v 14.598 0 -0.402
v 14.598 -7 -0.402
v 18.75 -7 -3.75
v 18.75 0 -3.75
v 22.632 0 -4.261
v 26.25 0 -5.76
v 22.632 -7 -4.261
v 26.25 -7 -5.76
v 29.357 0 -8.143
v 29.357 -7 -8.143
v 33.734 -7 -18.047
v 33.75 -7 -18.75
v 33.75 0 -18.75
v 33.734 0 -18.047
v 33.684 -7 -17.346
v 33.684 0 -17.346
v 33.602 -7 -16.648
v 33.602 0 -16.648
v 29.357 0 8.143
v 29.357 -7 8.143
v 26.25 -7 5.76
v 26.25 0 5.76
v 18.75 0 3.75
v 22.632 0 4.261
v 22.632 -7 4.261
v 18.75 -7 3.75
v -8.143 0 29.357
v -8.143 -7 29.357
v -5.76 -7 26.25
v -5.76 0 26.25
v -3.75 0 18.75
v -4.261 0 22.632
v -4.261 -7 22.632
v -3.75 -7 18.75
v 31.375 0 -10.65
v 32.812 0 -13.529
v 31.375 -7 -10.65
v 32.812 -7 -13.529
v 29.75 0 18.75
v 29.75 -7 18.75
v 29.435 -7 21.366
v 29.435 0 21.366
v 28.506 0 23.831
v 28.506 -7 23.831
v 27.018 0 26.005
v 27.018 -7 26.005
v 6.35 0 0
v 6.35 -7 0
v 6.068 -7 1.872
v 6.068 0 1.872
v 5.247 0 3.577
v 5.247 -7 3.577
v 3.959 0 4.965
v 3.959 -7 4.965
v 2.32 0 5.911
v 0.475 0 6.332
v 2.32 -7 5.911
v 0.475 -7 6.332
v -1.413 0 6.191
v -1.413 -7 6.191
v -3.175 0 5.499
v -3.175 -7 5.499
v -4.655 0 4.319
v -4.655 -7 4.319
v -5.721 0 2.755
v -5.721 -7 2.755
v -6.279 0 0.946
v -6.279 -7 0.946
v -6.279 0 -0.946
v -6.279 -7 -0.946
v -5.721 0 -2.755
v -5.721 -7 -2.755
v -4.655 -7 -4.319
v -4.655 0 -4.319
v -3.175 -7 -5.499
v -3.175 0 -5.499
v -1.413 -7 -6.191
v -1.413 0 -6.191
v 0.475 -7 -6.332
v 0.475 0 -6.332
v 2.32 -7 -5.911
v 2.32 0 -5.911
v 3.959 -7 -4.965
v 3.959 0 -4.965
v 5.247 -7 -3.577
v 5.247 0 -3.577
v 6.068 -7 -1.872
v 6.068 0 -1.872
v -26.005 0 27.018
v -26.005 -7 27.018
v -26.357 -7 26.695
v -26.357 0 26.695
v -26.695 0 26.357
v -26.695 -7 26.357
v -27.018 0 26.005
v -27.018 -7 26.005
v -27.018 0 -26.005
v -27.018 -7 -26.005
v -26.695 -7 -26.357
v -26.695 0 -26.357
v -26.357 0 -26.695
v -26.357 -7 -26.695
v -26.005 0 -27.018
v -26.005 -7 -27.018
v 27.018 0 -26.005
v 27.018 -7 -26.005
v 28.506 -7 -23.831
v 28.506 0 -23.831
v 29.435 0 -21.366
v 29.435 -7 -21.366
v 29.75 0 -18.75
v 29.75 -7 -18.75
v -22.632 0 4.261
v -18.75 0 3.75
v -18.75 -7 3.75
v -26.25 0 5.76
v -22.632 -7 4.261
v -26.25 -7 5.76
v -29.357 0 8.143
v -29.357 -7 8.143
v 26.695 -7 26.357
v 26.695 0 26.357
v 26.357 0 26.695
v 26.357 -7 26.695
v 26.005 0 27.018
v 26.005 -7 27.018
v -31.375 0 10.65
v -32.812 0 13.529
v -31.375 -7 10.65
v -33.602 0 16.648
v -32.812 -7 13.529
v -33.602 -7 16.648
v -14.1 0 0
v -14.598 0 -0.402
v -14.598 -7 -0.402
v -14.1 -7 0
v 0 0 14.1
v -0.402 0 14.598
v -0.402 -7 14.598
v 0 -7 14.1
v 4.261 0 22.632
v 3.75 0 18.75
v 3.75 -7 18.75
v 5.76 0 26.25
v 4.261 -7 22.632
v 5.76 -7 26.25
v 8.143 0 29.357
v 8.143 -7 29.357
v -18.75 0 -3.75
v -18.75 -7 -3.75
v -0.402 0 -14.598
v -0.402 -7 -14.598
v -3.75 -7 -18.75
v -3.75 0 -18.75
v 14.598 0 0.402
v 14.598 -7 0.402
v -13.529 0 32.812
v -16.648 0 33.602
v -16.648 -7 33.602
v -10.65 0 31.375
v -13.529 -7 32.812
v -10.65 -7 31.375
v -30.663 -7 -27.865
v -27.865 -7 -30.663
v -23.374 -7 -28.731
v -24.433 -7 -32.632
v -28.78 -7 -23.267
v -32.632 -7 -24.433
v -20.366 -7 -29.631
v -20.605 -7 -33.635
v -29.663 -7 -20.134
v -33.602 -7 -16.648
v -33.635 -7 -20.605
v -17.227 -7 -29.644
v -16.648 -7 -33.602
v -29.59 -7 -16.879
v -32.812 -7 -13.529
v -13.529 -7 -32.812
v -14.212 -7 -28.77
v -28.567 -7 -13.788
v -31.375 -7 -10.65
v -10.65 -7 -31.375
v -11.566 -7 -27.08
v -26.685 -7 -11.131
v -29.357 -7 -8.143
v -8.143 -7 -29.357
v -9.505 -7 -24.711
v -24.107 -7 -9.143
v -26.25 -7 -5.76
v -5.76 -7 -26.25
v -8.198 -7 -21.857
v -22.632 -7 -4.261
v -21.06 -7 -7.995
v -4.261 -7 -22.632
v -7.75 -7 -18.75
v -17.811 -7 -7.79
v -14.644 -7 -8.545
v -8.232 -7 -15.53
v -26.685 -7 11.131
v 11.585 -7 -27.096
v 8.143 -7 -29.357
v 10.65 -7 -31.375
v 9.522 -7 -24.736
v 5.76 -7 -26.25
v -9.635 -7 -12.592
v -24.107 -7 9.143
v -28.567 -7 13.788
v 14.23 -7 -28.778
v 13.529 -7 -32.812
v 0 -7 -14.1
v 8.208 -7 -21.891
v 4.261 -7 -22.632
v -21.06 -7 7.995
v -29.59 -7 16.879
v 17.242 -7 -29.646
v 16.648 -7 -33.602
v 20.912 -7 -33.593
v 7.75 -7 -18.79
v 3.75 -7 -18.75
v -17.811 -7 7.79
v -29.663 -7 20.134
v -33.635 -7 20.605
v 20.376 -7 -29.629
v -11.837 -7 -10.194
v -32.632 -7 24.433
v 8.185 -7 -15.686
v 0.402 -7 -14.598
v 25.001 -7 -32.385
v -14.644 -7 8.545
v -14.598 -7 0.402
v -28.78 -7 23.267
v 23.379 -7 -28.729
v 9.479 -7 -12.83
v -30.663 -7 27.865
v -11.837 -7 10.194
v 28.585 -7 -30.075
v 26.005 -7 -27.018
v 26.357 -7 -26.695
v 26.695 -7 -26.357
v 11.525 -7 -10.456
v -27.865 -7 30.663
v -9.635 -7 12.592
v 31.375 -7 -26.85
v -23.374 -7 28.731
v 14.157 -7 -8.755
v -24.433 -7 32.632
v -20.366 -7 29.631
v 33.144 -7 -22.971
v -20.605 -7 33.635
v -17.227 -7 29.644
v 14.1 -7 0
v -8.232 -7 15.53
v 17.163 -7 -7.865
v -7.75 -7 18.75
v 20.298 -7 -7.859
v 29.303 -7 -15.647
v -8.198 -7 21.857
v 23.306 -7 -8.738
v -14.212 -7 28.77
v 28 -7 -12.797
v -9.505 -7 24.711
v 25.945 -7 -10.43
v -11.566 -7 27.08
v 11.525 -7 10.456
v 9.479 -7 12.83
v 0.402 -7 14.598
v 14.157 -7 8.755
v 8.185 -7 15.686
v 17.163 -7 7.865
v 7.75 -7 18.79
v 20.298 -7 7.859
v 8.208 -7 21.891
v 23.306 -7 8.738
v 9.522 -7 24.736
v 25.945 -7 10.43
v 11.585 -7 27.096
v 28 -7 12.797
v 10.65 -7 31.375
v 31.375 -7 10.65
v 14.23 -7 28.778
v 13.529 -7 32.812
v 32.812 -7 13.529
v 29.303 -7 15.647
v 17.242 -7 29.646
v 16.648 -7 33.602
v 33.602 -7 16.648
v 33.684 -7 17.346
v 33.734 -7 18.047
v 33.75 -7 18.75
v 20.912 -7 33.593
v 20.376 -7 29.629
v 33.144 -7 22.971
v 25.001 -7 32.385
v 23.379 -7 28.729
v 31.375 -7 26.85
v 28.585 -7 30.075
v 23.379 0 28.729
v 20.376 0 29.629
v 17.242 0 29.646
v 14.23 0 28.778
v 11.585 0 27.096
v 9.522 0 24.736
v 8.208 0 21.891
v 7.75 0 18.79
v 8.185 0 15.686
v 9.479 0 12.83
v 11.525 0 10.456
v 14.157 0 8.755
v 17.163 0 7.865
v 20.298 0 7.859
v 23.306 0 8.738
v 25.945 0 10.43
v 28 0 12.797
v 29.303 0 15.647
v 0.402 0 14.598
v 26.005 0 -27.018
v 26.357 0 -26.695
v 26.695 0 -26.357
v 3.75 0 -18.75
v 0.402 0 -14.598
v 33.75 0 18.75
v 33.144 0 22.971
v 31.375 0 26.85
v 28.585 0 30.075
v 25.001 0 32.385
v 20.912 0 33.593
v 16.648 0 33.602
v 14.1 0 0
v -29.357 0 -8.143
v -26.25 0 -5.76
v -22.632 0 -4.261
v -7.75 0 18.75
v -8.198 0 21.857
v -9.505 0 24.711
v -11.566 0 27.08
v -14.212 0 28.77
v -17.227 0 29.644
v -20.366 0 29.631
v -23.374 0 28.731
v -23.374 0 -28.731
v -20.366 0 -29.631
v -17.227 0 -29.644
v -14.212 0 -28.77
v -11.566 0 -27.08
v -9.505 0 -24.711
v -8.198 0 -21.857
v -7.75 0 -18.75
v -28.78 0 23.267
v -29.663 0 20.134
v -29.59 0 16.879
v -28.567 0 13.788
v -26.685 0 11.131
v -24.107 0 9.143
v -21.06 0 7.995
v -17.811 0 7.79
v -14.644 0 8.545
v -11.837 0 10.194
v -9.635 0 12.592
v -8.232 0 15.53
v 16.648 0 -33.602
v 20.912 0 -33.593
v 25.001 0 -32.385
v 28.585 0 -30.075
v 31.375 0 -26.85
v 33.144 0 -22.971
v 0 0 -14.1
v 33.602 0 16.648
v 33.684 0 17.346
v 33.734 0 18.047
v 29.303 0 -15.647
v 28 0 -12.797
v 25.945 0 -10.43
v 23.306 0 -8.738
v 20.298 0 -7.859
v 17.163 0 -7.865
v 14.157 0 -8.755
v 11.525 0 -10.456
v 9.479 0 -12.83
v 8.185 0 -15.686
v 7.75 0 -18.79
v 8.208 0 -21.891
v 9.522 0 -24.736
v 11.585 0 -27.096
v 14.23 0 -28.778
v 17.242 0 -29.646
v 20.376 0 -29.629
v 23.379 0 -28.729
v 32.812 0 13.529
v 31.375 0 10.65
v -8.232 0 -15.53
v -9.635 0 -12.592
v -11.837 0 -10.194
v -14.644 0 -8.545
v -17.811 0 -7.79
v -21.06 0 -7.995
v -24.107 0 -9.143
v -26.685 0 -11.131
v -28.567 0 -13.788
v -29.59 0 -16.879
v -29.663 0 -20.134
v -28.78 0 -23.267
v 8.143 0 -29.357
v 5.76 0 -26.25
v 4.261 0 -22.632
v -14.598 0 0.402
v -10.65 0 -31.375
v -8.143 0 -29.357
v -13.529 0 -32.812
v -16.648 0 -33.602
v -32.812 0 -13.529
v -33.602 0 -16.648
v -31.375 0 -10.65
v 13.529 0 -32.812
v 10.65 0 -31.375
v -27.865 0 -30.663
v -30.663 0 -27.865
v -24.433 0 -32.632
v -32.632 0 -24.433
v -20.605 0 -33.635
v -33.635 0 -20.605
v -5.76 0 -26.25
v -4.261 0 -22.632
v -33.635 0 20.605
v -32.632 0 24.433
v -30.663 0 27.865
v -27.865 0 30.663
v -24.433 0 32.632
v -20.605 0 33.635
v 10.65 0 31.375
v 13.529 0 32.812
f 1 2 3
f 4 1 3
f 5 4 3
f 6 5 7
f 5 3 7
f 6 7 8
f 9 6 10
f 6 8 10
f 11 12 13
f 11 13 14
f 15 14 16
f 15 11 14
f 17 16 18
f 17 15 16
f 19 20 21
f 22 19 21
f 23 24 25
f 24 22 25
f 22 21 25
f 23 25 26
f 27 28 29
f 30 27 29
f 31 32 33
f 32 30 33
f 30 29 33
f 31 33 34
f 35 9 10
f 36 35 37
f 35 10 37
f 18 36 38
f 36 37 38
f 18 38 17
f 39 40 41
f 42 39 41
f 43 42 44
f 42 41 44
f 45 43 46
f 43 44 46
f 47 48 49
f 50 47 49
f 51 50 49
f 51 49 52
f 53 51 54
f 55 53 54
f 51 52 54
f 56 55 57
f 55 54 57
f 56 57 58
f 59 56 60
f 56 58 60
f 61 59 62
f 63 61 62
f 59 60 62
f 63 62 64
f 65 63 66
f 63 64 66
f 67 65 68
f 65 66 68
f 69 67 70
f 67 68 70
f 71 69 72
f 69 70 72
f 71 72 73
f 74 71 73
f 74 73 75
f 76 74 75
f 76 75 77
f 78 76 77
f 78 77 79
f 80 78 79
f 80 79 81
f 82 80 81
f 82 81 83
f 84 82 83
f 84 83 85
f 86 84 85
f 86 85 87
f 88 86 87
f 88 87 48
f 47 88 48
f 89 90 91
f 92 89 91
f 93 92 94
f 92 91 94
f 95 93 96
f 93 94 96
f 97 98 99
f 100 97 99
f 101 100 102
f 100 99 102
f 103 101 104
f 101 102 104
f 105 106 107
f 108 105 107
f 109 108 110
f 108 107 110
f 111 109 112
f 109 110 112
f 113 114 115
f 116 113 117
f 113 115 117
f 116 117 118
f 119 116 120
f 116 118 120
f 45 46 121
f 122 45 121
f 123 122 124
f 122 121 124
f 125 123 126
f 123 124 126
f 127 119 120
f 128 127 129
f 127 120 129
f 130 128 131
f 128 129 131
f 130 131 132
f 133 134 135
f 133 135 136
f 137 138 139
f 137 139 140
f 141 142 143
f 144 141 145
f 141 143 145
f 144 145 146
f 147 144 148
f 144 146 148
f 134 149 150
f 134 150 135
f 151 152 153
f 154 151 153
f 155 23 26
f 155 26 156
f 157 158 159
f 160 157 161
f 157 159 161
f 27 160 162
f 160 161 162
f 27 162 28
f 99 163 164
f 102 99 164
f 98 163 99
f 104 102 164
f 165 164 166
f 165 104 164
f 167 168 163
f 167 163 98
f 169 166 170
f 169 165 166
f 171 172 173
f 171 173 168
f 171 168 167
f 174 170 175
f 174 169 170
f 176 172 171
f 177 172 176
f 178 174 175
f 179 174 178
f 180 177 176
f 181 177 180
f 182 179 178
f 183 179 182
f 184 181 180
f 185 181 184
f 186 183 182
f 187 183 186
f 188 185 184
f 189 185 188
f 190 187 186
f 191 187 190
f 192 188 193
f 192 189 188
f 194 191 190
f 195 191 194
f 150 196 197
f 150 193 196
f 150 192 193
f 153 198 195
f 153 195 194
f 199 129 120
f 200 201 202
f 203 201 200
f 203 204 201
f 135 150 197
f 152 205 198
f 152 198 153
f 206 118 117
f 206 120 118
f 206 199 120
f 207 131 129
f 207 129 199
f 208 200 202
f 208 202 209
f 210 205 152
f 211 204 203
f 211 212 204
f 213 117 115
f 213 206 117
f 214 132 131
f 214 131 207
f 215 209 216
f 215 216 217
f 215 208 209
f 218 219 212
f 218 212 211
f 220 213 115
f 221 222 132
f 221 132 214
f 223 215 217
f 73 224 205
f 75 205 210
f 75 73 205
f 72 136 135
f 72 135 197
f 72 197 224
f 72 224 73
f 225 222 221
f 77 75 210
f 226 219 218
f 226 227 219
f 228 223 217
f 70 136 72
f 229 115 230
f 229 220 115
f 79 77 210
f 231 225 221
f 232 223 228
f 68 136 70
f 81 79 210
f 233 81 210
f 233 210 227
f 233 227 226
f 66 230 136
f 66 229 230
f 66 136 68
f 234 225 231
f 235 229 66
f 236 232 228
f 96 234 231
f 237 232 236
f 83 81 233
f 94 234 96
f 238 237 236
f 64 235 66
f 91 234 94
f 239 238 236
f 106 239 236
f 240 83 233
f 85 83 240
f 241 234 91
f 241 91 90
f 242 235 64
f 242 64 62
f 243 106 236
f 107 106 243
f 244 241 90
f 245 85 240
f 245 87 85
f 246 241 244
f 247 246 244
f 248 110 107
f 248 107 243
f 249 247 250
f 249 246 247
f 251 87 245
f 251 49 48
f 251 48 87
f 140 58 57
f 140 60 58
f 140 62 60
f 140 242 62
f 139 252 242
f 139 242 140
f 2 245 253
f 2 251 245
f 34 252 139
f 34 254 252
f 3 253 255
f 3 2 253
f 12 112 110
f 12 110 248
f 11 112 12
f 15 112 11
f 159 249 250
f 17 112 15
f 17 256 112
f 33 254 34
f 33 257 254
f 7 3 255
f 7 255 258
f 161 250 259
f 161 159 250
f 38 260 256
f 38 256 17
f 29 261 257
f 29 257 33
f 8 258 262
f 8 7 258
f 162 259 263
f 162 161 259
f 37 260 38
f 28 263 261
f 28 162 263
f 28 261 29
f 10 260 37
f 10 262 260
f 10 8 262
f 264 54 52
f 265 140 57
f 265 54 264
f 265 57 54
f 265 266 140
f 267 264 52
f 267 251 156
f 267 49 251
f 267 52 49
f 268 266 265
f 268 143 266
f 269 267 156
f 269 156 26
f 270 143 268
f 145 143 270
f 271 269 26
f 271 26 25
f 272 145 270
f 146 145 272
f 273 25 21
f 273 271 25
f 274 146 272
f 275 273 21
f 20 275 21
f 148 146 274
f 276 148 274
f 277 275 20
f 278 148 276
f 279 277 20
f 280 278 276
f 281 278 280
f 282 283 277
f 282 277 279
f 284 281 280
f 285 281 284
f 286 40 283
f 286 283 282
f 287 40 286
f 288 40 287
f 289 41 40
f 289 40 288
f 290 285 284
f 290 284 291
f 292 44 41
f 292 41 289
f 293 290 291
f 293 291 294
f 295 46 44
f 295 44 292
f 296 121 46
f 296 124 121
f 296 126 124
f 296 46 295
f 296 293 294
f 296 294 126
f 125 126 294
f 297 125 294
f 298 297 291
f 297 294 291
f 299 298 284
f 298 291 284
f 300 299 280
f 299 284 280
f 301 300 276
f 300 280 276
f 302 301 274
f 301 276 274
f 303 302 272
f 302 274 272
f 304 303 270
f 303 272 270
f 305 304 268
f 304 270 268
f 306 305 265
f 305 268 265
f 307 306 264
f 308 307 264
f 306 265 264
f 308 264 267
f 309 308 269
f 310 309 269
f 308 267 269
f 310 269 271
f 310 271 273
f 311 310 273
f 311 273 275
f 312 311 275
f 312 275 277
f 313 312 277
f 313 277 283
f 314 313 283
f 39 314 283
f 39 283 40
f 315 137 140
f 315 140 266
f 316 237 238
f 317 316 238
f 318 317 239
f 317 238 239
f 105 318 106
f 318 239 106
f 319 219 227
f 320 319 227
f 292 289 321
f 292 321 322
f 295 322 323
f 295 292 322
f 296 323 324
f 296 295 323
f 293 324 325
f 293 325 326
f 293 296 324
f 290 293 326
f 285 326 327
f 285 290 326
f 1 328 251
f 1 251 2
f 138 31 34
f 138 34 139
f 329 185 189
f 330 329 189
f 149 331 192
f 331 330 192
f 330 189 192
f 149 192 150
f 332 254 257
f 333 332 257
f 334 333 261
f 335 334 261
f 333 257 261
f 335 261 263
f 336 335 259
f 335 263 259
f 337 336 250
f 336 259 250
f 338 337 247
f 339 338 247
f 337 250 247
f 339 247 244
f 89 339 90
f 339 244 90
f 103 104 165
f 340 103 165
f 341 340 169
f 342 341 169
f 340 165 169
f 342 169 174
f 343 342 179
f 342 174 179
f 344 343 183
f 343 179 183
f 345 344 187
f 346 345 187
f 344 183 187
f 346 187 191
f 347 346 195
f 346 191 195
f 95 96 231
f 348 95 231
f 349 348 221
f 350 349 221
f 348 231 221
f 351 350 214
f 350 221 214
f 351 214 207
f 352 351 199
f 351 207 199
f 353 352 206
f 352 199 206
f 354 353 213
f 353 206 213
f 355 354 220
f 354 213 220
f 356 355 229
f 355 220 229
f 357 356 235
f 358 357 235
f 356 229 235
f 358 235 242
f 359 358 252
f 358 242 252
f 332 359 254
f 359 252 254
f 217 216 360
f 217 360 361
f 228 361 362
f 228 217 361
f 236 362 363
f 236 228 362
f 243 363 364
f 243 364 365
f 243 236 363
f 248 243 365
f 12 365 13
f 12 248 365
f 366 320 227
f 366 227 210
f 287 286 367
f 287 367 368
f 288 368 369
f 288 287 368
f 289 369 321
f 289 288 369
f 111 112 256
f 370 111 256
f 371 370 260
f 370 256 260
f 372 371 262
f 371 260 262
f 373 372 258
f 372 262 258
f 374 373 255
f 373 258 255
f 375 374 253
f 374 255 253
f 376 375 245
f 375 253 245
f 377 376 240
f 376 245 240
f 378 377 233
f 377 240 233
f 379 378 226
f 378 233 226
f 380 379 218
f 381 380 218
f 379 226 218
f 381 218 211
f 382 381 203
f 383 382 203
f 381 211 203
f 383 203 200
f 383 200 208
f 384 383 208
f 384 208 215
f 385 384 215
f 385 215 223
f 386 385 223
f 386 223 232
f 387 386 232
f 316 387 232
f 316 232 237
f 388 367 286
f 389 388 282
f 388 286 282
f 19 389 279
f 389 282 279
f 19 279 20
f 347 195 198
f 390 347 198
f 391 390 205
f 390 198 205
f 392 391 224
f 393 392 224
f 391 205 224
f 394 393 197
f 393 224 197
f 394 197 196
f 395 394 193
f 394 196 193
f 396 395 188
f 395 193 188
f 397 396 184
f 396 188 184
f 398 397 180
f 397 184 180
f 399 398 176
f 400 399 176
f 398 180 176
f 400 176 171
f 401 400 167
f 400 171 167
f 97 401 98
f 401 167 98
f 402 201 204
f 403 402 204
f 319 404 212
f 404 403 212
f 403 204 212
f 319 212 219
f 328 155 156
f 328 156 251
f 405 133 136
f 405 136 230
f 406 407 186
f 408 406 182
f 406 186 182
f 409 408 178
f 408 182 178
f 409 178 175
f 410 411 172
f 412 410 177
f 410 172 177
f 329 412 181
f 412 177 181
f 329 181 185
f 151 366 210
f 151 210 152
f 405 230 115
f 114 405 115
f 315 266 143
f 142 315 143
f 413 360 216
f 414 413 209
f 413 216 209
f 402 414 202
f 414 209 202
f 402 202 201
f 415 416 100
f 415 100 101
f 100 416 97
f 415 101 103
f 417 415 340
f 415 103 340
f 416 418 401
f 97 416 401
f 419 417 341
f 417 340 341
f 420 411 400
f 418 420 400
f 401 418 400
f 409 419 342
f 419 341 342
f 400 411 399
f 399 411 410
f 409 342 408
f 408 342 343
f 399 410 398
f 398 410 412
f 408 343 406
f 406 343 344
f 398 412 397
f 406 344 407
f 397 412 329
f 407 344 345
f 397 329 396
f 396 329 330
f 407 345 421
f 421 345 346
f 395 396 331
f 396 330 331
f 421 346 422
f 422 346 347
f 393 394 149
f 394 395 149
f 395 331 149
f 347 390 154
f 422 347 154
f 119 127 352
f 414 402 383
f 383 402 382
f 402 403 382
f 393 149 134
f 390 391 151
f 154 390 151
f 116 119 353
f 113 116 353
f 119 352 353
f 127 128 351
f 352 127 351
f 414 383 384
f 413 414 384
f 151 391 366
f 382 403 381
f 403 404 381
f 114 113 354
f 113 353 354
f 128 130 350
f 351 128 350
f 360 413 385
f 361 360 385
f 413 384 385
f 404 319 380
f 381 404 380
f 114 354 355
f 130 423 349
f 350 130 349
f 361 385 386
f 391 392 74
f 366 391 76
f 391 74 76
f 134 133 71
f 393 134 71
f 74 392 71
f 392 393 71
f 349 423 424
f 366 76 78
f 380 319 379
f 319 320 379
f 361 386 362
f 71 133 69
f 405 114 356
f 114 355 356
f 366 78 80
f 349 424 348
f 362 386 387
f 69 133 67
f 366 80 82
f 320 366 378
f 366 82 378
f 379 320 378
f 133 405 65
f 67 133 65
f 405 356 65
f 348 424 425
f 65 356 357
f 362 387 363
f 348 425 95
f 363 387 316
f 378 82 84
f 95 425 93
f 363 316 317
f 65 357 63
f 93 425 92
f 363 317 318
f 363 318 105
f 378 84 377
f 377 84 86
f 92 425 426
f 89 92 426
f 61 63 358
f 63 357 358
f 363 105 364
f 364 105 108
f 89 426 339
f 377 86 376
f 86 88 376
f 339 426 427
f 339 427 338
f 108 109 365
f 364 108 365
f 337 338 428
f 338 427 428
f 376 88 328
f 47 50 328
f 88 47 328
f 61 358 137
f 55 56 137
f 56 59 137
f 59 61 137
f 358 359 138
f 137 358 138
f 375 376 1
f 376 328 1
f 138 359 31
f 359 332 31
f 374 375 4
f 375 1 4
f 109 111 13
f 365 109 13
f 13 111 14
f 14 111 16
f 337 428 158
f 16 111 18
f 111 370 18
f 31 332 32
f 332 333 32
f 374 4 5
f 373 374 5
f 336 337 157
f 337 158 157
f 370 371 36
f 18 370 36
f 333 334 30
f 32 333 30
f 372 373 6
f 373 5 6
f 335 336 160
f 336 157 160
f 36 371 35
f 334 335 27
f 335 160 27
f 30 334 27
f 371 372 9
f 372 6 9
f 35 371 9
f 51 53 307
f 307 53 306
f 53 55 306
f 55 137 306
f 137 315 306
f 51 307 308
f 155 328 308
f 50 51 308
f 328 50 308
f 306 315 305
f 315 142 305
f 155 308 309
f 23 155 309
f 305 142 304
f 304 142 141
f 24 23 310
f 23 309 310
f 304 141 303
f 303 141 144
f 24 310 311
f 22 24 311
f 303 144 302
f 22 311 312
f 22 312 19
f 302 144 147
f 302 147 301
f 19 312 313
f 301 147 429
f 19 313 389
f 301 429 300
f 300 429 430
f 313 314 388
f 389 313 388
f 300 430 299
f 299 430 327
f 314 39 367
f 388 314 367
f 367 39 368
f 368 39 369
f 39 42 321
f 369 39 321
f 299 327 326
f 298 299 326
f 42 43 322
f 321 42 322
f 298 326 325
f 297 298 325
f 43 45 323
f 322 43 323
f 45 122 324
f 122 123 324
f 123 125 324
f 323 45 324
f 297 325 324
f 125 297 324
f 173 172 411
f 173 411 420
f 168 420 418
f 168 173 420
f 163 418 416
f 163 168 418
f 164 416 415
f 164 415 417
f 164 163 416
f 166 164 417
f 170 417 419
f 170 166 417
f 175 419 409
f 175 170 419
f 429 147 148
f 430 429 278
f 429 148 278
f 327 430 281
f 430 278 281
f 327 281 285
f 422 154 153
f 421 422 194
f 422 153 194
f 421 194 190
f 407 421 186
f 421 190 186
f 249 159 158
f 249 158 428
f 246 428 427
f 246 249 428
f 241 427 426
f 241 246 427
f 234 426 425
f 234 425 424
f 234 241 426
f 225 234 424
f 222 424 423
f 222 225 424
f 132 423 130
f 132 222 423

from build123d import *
from build123d import SkipClean  # not in build123d's __all__

# Parameters (mm, degrees)
F0_R     = 37.5
F1_DEPTH = 7
F2_R     = 6.35
F3_DEPTH = 7.001
F5_DEPTH = 7.001
F7_DEPTH = 7
F9_DEPTH = 7.001


with BuildPart() as f1:
    # F0 (on Front) → F1 (new body)
    with BuildSketch(Plane.XZ):
        Circle(F0_R)
    extrude(amount=F1_DEPTH)

    # F2 (on face) → F3 (cut, through all)
    with BuildSketch(Plane.XZ.offset(7)):
        Circle(F2_R)
    extrude(amount=-F3_DEPTH, mode=Mode.SUBTRACT)

    # F4 (on face) → F5 (cut, through all)
    with BuildSketch(Plane.XZ.offset(7)):
        with BuildLine():
            Line((-8.1433982822, 29.3566017178), (0, 37.5))
            ThreePointArc((0, 37.5), (-8.5491327229, 36.5124955281), (-16.6480090834, 33.6019909166))
            ThreePointArc((-16.6480090834, 33.6019909166), (-12.0505288232, 32.1707706914), (-8.1433982822, 29.3566017178))
        make_face()
        with BuildLine():
            ThreePointArc((16.6480090834, 33.6019909166), (8.5491327229, 36.5124955281), (0, 37.5))
            Line((0, 37.5), (8.1433982822, 29.3566017178))
            ThreePointArc((8.1433982822, 29.3566017178), (12.0505288232, 32.1707706914), (16.6480090834, 33.6019909166))
        make_face()
        with BuildLine():
            Line((0, 18.75), (0, 37.5))
            Line((0, 37.5), (-8.1433982822, 29.3566017178))
            ThreePointArc((-8.1433982822, 29.3566017178), (-4.8918070123, 24.4902514855), (-3.75, 18.75))
            Line((-3.75, 18.75), (0, 18.75))
        make_face()
        with BuildLine():
            Line((8.1433982822, 29.3566017178), (0, 37.5))
            Line((0, 37.5), (0, 18.75))
            Line((0, 18.75), (3.75, 18.75))
            ThreePointArc((3.75, 18.75), (4.8918070123, 24.4902514855), (8.1433982822, 29.3566017178))
        make_face()
        Polygon((0, 15), (0, 18.75), (-3.75, 18.75), align=None)
        Polygon((0, 15), (-3.75, 18.75), (-0.4017027864, 14.5982972136), align=None)
        Polygon((3.75, 18.75), (0, 18.75), (0, 15), align=None)
        Polygon((0.4017027864, 14.5982972136), (3.75, 18.75), (0, 15), align=None)
        with BuildLine():
            Line((-29.3566017178, -8.1433982822), (-37.5, 0))
            ThreePointArc((-37.5, 0), (-36.5124955281, -8.5491327229), (-33.6019909166, -16.6480090834))
            ThreePointArc((-33.6019909166, -16.6480090834), (-32.1707706914, -12.0505288232), (-29.3566017178, -8.1433982822))
        make_face()
        with BuildLine():
            ThreePointArc((-29.3566017178, 8.1433982822), (-32.1707706914, 12.0505288232), (-33.6019909166, 16.6480090834))
            ThreePointArc((-33.6019909166, 16.6480090834), (-36.5124955281, 8.5491327229), (-37.5, 0))
            Line((-37.5, 0), (-29.3566017178, 8.1433982822))
        make_face()
        with BuildLine():
            ThreePointArc((-18.75, 3.75), (-24.4902514855, 4.8918070123), (-29.3566017178, 8.1433982822))
            Line((-29.3566017178, 8.1433982822), (-37.5, 0))
            Line((-37.5, 0), (-18.75, 0))
            Line((-18.75, 0), (-18.75, 3.75))
        make_face()
        with BuildLine():
            Line((-18.75, 0), (-37.5, 0))
            Line((-37.5, 0), (-29.3566017178, -8.1433982822))
            ThreePointArc((-29.3566017178, -8.1433982822), (-24.4902514855, -4.8918070123), (-18.75, -3.75))
            Line((-18.75, -3.75), (-18.75, 0))
        make_face()
        Polygon((0.4017027864, 14.5982972136), (0, 15), (0, 14.1002080444), align=None)
        Polygon((0, 14.1002080444), (0, 15), (-0.4017027864, 14.5982972136), align=None)
        Polygon((-15, 0), (-18.75, 3.75), (-18.75, 0), align=None)
        Polygon((-14.5982972136, 0.4017027864), (-18.75, 3.75), (-15, 0), align=None)
        Polygon((-14.5982972136, 0.4017027864), (-15, 0), (-14.1002080444, 0), align=None)
        Polygon((-14.1002080444, 0), (-15, 0), (-14.5982972136, -0.4017027864), align=None)
        Polygon((-14.5982972136, -0.4017027864), (-15, 0), (-18.75, -3.75), align=None)
        Polygon((-15, 0), (-18.75, 0), (-18.75, -3.75), align=None)
        with BuildLine():
            ThreePointArc((-8.1433982822, -29.3566017178), (-12.0505288232, -32.1707706914), (-16.6480090834, -33.6019909166))
            ThreePointArc((-16.6480090834, -33.6019909166), (-8.5491327229, -36.5124955281), (0, -37.5))
            Line((0, -37.5), (-8.1433982822, -29.3566017178))
        make_face()
        with BuildLine():
            ThreePointArc((0, -37.5), (8.5491327229, -36.5124955281), (16.6480090834, -33.6019909166))
            ThreePointArc((16.6480090834, -33.6019909166), (12.0505288232, -32.1707706914), (8.1433982822, -29.3566017178))
            Line((8.1433982822, -29.3566017178), (0, -37.5))
        make_face()
        with BuildLine():
            Line((0, -37.5), (8.1433982822, -29.3566017178))
            ThreePointArc((8.1433982822, -29.3566017178), (4.8918070123, -24.4902514855), (3.75, -18.75))
            Line((3.75, -18.75), (0, -18.75))
            Line((0, -18.75), (0, -37.5))
        make_face()
        with BuildLine():
            Line((-8.1433982822, -29.3566017178), (0, -37.5))
            Line((0, -37.5), (0, -18.75))
            Line((0, -18.75), (-3.75, -18.75))
            ThreePointArc((-3.75, -18.75), (-4.8918070123, -24.4902514855), (-8.1433982822, -29.3566017178))
        make_face()
        Polygon((-0.4017027864, -14.5982972136), (0, -15), (0, -14.1002080444), align=None)
        Polygon((0, -14.1002080444), (0, -15), (0.4017027864, -14.5982972136), align=None)
        Polygon((0, -15), (3.75, -18.75), (0.4017027864, -14.5982972136), align=None)
        Polygon((-0.4017027864, -14.5982972136), (-3.75, -18.75), (0, -15), align=None)
        Polygon((0, -15), (-3.75, -18.75), (0, -18.75), align=None)
        Polygon((0, -18.75), (3.75, -18.75), (0, -15), align=None)
        with BuildLine():
            ThreePointArc((37.5, 0), (36.5124955281, 8.5491327229), (33.6019909166, 16.6480090834))
            ThreePointArc((33.6019909166, 16.6480090834), (32.1707706914, 12.0505288232), (29.3566017178, 8.1433982822))
            Line((29.3566017178, 8.1433982822), (37.5, 0))
        make_face()
        with BuildLine():
            Line((37.5, 0), (29.3566017178, 8.1433982822))
            ThreePointArc((29.3566017178, 8.1433982822), (24.4902514855, 4.8918070123), (18.75, 3.75))
            Line((18.75, 3.75), (18.75, 0))
            Line((18.75, 0), (37.5, 0))
        make_face()
        with BuildLine():
            ThreePointArc((33.6019909166, -16.6480090834), (36.5124955281, -8.5491327229), (37.5, 0))
            Line((37.5, 0), (29.3566017178, -8.1433982822))
            ThreePointArc((29.3566017178, -8.1433982822), (32.1707706914, -12.0505288232), (33.6019909166, -16.6480090834))
        make_face()
        with BuildLine():
            Line((29.3566017178, -8.1433982822), (37.5, 0))
            Line((37.5, 0), (18.75, 0))
            Line((18.75, 0), (18.75, -3.75))
            ThreePointArc((18.75, -3.75), (24.4902514855, -4.8918070123), (29.3566017178, -8.1433982822))
        make_face()
        Polygon((15, 0), (18.75, 3.75), (14.5982972136, 0.4017027864), align=None)
        Polygon((18.75, 0), (18.75, 3.75), (15, 0), align=None)
        Polygon((18.75, -3.75), (18.75, 0), (15, 0), align=None)
        Polygon((18.75, -3.75), (15, 0), (14.5982972136, -0.4017027864), align=None)
        Polygon((14.5982972136, -0.4017027864), (15, 0), (14.1002080444, 0), align=None)
        Polygon((14.1002080444, 0), (15, 0), (14.5982972136, 0.4017027864), align=None)
    extrude(amount=-F5_DEPTH, mode=Mode.SUBTRACT)

    # F6 (on face) → F7 (join)
    with BuildSketch(Plane.XZ.offset(7)):
        with BuildLine():
            ThreePointArc((-33.6019909166, 16.6480090834), (-26.5165042945, 26.5165042945), (-16.6480090834, 33.6019909166))
            ThreePointArc((-16.6480090834, 33.6019909166), (-29.3566017178, 29.3566017178), (-33.6019909166, 16.6480090834))
        make_face()
        with BuildLine():
            ThreePointArc((-16.6480090834, -33.6019909166), (-26.5165042945, -26.5165042945), (-33.6019909166, -16.6480090834))
            ThreePointArc((-33.6019909166, -16.6480090834), (-29.3566017178, -29.3566017178), (-16.6480090834, -33.6019909166))
        make_face()
        with BuildLine():
            ThreePointArc((33.75, -18.75), (33.7129519773, -17.6964022943), (33.6019909166, -16.6480090834))
            ThreePointArc((33.6019909166, -16.6480090834), (26.5165042945, -26.5165042945), (16.6480090834, -33.6019909166))
            ThreePointArc((16.6480090834, -33.6019909166), (28.5853987273, -30.0754108921), (33.75, -18.75))
        make_face()
        with BuildLine():
            ThreePointArc((33.75, 18.75), (28.5853987273, 30.0754108921), (16.6480090834, 33.6019909166))
            ThreePointArc((16.6480090834, 33.6019909166), (26.5165042945, 26.5165042945), (33.6019909166, 16.6480090834))
            ThreePointArc((33.6019909166, 16.6480090834), (33.7129519773, 17.6964022943), (33.75, 18.75))
        make_face()
    with SkipClean():  # cleaning this boolean's faces spoils the solid; the shape is the same uncleaned
        extrude(amount=-F7_DEPTH)

    # F8 (on face) → F9 (cut, through all)
    with BuildSketch(Plane.XZ.offset(7)):
        with BuildLine():
            ThreePointArc((-27.0181551222, 26.0051782112), (-26.5165042945, 26.5165042945), (-26.0051782112, 27.0181551222))
            ThreePointArc((-26.0051782112, 27.0181551222), (-26.5281745931, 26.5281745931), (-27.0181551222, 26.0051782112))
        make_face()
        with BuildLine():
            ThreePointArc((-27.0181551222, 26.0051782112), (-22.6262284283, 8.4555911694), (-7.75, 18.75))
            ThreePointArc((-7.75, 18.75), (-14.2116611146, 28.7701536995), (-26.0051782112, 27.0181551222))
            ThreePointArc((-26.0051782112, 27.0181551222), (-26.5165042945, 26.5165042945), (-27.0181551222, 26.0051782112))
        make_face()
        with BuildLine():
            ThreePointArc((27.0181551222, 26.0051782112), (26.5281745931, 26.5281745931), (26.0051782112, 27.0181551222))
            ThreePointArc((26.0051782112, 27.0181551222), (26.5165042945, 26.5165042945), (27.0181551222, 26.0051782112))
        make_face()
        with BuildLine():
            ThreePointArc((27.0181551222, 26.0051782112), (26.5165042945, 26.5165042945), (26.0051782112, 27.0181551222))
            ThreePointArc((26.0051782112, 27.0181551222), (8.7298463005, 14.2116611146), (29.75, 18.75))
            ThreePointArc((29.75, 18.75), (29.0444088306, 22.6262284283), (27.0181551222, 26.0051782112))
        make_face()
        with BuildLine():
            ThreePointArc((26.0051782112, -27.0181551222), (26.5281745931, -26.5281745931), (27.0181551222, -26.0051782112))
            ThreePointArc((27.0181551222, -26.0051782112), (26.5165042945, -26.5165042945), (26.0051782112, -27.0181551222))
        make_face()
        with BuildLine():
            ThreePointArc((26.0051782112, -27.0181551222), (26.5165042945, -26.5165042945), (27.0181551222, -26.0051782112))
            ThreePointArc((27.0181551222, -26.0051782112), (29.0444088306, -22.6262284283), (29.75, -18.75))
            ThreePointArc((29.75, -18.75), (8.7298463005, -14.2116611146), (26.0051782112, -27.0181551222))
        make_face()
        with BuildLine():
            ThreePointArc((-26.0051782112, -27.0181551222), (-26.5165042945, -26.5165042945), (-27.0181551222, -26.0051782112))
            ThreePointArc((-27.0181551222, -26.0051782112), (-26.5281745931, -26.5281745931), (-26.0051782112, -27.0181551222))
        make_face()
        with BuildLine():
            ThreePointArc((-7.75, -18.75), (-22.6262284283, -8.4555911694), (-27.0181551222, -26.0051782112))
            ThreePointArc((-27.0181551222, -26.0051782112), (-26.5165042945, -26.5165042945), (-26.0051782112, -27.0181551222))
            ThreePointArc((-26.0051782112, -27.0181551222), (-14.2116611146, -28.7701536995), (-7.75, -18.75))
        make_face()
    extrude(amount=-F9_DEPTH, mode=Mode.SUBTRACT)


solid = f1.part
